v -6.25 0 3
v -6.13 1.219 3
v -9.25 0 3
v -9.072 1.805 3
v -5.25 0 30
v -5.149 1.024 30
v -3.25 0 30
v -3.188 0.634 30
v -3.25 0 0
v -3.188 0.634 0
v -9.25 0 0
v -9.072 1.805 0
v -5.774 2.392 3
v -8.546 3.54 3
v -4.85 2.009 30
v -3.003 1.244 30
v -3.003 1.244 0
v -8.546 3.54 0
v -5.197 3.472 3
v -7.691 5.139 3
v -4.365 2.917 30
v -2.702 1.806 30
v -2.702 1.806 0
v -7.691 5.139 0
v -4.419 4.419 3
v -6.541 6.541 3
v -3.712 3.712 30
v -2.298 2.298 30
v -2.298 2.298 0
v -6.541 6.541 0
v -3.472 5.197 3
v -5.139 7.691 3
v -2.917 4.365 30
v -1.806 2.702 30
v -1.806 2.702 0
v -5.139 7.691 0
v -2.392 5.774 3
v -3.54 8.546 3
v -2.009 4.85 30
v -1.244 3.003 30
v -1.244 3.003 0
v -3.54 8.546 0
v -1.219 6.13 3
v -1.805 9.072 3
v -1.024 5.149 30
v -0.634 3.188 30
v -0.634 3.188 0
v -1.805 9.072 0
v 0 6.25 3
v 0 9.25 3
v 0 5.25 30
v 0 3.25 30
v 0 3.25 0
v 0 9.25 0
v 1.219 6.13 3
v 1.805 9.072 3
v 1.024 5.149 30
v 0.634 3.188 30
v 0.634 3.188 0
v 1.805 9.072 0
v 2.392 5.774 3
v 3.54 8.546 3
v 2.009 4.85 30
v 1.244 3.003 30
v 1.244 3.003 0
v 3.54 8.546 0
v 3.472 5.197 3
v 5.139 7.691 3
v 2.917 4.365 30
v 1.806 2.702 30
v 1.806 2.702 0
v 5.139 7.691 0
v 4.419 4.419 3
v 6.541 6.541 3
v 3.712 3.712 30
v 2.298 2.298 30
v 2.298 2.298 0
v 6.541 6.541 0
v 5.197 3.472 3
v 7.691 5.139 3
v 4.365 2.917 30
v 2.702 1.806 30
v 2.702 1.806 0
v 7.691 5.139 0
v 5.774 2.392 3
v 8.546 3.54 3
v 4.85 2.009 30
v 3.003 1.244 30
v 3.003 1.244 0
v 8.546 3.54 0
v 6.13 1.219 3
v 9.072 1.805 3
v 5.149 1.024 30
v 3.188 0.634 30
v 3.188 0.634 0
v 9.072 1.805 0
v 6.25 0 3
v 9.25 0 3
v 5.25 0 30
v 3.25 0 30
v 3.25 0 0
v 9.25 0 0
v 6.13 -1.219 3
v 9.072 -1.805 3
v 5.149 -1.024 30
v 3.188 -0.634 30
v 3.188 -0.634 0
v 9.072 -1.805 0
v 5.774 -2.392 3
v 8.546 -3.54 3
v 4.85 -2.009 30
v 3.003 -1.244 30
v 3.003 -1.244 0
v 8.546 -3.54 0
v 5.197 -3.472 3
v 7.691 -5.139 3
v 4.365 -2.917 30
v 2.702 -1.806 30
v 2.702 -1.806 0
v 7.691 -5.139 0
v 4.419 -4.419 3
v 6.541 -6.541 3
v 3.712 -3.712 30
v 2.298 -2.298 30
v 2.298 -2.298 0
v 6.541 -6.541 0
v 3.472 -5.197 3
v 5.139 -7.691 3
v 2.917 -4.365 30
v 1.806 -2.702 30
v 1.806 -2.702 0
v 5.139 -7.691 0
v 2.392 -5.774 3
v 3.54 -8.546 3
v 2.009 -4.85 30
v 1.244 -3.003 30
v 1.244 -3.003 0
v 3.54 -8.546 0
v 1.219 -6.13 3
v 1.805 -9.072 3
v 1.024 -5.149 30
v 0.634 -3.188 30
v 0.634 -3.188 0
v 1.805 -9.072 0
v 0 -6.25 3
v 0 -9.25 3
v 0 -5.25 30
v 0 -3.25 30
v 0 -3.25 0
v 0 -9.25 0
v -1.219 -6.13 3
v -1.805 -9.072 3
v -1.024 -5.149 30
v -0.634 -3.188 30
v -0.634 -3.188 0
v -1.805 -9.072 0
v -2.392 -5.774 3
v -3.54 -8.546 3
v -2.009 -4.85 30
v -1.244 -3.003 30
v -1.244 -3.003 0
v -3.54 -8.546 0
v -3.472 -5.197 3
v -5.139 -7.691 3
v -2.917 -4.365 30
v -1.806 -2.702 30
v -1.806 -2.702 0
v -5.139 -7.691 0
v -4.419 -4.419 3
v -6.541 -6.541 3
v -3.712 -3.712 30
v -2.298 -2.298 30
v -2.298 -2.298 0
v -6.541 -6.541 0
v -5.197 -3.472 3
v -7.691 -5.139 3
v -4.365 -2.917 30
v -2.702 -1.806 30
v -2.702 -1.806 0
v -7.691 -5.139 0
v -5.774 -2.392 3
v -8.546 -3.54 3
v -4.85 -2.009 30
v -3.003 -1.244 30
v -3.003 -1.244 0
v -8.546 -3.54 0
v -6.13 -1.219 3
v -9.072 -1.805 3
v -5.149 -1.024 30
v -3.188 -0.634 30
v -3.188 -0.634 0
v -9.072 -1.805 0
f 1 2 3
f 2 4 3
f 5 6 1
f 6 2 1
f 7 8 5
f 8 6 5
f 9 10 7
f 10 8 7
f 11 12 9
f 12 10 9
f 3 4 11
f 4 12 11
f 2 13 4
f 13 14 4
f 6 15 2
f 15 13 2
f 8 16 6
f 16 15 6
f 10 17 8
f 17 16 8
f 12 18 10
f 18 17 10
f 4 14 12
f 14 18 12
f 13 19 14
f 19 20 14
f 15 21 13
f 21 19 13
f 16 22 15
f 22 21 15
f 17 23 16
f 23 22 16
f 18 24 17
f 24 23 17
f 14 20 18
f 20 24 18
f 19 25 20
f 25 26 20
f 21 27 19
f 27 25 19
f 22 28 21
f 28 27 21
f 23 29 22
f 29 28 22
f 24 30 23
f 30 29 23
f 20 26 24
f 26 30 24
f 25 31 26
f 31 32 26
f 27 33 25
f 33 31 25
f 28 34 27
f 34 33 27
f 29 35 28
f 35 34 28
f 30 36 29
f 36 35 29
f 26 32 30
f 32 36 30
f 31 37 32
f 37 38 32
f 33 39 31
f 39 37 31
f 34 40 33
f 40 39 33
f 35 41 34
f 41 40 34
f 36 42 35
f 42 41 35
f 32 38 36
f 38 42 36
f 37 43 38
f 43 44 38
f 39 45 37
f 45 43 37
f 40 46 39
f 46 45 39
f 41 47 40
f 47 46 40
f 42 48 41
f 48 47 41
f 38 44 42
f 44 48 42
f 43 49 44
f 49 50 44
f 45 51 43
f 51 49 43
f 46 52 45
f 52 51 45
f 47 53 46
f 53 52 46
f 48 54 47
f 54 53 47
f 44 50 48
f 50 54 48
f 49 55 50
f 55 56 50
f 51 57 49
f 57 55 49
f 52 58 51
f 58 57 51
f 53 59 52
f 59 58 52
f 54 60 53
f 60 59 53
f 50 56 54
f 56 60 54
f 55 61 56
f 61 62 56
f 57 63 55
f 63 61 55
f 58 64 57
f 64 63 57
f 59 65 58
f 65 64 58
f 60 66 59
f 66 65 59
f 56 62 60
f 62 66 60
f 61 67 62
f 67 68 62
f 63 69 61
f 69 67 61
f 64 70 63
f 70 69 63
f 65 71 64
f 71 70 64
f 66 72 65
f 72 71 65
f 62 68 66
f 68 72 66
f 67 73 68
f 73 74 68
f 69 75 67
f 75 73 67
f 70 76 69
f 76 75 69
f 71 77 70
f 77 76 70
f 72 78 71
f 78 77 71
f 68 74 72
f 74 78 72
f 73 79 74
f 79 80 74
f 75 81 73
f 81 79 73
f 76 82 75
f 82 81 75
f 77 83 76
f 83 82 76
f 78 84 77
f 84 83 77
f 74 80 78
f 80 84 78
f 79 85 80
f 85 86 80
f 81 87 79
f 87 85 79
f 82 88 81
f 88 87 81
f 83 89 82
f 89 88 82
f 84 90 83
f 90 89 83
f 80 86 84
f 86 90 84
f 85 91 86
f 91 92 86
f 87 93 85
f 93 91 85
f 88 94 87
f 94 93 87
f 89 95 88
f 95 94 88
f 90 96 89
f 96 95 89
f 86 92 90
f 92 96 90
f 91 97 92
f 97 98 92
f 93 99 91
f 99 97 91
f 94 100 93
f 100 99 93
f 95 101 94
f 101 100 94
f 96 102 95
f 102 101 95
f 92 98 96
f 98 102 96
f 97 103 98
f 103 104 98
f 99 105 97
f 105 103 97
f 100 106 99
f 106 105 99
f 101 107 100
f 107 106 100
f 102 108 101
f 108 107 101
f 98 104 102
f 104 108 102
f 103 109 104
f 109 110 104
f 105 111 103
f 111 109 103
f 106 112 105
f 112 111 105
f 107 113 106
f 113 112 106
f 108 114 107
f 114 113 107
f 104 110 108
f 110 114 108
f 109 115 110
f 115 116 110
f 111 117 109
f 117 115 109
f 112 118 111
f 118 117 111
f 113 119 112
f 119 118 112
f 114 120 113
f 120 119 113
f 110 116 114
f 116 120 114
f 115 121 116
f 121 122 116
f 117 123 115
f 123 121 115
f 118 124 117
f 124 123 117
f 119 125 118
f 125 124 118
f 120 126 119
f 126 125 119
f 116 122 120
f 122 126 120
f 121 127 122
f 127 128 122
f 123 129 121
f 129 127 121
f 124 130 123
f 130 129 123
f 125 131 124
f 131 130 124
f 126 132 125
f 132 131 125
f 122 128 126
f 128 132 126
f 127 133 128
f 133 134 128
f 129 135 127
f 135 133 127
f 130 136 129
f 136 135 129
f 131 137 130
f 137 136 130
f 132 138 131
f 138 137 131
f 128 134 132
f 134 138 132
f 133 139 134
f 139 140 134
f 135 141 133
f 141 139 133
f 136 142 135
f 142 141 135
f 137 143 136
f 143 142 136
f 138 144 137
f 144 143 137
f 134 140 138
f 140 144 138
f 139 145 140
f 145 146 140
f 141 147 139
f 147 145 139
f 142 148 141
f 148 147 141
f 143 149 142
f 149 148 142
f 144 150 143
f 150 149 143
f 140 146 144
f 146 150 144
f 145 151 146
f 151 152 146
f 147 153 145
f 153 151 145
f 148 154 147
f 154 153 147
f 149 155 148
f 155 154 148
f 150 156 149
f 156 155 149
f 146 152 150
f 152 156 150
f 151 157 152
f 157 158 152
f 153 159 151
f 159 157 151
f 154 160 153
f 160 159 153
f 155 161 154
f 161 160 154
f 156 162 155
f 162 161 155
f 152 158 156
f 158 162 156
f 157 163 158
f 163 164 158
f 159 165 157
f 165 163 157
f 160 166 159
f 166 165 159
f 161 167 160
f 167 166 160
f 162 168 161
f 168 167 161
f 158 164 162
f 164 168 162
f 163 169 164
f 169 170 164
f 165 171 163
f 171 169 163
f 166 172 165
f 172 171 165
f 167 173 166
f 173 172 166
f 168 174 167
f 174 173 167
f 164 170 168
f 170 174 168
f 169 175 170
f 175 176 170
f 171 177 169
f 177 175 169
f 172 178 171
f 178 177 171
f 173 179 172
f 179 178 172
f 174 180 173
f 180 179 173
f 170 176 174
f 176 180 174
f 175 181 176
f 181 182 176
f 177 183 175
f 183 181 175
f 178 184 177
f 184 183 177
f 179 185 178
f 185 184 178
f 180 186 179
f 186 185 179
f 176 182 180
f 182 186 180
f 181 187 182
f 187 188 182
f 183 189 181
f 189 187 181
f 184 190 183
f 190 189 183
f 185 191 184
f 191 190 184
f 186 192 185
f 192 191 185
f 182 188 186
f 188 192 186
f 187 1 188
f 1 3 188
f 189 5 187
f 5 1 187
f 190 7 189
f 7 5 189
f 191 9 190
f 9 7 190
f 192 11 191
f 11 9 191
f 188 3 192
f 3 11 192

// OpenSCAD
$fn = 32;

// ----------------------------------------------------------------------
// Profiled standoff: conical spacer, 30 mm long, bore 6.5 mm
// ----------------------------------------------------------------------

// --- parameters (mm) ---
revolve_angle = 360;      // full turn around the Z axis
profile_points = 6;       // points of the closed outline

profile = [[3.25, 0], [9.25, 0], [9.25, 3], [6.25, 3], [5.25, 30], [3.25, 30]];  // single closed polygon, 6 points, counter clockwise

// --- the one profile operation ---
rotate_extrude(angle = revolve_angle) polygon(points = profile);
